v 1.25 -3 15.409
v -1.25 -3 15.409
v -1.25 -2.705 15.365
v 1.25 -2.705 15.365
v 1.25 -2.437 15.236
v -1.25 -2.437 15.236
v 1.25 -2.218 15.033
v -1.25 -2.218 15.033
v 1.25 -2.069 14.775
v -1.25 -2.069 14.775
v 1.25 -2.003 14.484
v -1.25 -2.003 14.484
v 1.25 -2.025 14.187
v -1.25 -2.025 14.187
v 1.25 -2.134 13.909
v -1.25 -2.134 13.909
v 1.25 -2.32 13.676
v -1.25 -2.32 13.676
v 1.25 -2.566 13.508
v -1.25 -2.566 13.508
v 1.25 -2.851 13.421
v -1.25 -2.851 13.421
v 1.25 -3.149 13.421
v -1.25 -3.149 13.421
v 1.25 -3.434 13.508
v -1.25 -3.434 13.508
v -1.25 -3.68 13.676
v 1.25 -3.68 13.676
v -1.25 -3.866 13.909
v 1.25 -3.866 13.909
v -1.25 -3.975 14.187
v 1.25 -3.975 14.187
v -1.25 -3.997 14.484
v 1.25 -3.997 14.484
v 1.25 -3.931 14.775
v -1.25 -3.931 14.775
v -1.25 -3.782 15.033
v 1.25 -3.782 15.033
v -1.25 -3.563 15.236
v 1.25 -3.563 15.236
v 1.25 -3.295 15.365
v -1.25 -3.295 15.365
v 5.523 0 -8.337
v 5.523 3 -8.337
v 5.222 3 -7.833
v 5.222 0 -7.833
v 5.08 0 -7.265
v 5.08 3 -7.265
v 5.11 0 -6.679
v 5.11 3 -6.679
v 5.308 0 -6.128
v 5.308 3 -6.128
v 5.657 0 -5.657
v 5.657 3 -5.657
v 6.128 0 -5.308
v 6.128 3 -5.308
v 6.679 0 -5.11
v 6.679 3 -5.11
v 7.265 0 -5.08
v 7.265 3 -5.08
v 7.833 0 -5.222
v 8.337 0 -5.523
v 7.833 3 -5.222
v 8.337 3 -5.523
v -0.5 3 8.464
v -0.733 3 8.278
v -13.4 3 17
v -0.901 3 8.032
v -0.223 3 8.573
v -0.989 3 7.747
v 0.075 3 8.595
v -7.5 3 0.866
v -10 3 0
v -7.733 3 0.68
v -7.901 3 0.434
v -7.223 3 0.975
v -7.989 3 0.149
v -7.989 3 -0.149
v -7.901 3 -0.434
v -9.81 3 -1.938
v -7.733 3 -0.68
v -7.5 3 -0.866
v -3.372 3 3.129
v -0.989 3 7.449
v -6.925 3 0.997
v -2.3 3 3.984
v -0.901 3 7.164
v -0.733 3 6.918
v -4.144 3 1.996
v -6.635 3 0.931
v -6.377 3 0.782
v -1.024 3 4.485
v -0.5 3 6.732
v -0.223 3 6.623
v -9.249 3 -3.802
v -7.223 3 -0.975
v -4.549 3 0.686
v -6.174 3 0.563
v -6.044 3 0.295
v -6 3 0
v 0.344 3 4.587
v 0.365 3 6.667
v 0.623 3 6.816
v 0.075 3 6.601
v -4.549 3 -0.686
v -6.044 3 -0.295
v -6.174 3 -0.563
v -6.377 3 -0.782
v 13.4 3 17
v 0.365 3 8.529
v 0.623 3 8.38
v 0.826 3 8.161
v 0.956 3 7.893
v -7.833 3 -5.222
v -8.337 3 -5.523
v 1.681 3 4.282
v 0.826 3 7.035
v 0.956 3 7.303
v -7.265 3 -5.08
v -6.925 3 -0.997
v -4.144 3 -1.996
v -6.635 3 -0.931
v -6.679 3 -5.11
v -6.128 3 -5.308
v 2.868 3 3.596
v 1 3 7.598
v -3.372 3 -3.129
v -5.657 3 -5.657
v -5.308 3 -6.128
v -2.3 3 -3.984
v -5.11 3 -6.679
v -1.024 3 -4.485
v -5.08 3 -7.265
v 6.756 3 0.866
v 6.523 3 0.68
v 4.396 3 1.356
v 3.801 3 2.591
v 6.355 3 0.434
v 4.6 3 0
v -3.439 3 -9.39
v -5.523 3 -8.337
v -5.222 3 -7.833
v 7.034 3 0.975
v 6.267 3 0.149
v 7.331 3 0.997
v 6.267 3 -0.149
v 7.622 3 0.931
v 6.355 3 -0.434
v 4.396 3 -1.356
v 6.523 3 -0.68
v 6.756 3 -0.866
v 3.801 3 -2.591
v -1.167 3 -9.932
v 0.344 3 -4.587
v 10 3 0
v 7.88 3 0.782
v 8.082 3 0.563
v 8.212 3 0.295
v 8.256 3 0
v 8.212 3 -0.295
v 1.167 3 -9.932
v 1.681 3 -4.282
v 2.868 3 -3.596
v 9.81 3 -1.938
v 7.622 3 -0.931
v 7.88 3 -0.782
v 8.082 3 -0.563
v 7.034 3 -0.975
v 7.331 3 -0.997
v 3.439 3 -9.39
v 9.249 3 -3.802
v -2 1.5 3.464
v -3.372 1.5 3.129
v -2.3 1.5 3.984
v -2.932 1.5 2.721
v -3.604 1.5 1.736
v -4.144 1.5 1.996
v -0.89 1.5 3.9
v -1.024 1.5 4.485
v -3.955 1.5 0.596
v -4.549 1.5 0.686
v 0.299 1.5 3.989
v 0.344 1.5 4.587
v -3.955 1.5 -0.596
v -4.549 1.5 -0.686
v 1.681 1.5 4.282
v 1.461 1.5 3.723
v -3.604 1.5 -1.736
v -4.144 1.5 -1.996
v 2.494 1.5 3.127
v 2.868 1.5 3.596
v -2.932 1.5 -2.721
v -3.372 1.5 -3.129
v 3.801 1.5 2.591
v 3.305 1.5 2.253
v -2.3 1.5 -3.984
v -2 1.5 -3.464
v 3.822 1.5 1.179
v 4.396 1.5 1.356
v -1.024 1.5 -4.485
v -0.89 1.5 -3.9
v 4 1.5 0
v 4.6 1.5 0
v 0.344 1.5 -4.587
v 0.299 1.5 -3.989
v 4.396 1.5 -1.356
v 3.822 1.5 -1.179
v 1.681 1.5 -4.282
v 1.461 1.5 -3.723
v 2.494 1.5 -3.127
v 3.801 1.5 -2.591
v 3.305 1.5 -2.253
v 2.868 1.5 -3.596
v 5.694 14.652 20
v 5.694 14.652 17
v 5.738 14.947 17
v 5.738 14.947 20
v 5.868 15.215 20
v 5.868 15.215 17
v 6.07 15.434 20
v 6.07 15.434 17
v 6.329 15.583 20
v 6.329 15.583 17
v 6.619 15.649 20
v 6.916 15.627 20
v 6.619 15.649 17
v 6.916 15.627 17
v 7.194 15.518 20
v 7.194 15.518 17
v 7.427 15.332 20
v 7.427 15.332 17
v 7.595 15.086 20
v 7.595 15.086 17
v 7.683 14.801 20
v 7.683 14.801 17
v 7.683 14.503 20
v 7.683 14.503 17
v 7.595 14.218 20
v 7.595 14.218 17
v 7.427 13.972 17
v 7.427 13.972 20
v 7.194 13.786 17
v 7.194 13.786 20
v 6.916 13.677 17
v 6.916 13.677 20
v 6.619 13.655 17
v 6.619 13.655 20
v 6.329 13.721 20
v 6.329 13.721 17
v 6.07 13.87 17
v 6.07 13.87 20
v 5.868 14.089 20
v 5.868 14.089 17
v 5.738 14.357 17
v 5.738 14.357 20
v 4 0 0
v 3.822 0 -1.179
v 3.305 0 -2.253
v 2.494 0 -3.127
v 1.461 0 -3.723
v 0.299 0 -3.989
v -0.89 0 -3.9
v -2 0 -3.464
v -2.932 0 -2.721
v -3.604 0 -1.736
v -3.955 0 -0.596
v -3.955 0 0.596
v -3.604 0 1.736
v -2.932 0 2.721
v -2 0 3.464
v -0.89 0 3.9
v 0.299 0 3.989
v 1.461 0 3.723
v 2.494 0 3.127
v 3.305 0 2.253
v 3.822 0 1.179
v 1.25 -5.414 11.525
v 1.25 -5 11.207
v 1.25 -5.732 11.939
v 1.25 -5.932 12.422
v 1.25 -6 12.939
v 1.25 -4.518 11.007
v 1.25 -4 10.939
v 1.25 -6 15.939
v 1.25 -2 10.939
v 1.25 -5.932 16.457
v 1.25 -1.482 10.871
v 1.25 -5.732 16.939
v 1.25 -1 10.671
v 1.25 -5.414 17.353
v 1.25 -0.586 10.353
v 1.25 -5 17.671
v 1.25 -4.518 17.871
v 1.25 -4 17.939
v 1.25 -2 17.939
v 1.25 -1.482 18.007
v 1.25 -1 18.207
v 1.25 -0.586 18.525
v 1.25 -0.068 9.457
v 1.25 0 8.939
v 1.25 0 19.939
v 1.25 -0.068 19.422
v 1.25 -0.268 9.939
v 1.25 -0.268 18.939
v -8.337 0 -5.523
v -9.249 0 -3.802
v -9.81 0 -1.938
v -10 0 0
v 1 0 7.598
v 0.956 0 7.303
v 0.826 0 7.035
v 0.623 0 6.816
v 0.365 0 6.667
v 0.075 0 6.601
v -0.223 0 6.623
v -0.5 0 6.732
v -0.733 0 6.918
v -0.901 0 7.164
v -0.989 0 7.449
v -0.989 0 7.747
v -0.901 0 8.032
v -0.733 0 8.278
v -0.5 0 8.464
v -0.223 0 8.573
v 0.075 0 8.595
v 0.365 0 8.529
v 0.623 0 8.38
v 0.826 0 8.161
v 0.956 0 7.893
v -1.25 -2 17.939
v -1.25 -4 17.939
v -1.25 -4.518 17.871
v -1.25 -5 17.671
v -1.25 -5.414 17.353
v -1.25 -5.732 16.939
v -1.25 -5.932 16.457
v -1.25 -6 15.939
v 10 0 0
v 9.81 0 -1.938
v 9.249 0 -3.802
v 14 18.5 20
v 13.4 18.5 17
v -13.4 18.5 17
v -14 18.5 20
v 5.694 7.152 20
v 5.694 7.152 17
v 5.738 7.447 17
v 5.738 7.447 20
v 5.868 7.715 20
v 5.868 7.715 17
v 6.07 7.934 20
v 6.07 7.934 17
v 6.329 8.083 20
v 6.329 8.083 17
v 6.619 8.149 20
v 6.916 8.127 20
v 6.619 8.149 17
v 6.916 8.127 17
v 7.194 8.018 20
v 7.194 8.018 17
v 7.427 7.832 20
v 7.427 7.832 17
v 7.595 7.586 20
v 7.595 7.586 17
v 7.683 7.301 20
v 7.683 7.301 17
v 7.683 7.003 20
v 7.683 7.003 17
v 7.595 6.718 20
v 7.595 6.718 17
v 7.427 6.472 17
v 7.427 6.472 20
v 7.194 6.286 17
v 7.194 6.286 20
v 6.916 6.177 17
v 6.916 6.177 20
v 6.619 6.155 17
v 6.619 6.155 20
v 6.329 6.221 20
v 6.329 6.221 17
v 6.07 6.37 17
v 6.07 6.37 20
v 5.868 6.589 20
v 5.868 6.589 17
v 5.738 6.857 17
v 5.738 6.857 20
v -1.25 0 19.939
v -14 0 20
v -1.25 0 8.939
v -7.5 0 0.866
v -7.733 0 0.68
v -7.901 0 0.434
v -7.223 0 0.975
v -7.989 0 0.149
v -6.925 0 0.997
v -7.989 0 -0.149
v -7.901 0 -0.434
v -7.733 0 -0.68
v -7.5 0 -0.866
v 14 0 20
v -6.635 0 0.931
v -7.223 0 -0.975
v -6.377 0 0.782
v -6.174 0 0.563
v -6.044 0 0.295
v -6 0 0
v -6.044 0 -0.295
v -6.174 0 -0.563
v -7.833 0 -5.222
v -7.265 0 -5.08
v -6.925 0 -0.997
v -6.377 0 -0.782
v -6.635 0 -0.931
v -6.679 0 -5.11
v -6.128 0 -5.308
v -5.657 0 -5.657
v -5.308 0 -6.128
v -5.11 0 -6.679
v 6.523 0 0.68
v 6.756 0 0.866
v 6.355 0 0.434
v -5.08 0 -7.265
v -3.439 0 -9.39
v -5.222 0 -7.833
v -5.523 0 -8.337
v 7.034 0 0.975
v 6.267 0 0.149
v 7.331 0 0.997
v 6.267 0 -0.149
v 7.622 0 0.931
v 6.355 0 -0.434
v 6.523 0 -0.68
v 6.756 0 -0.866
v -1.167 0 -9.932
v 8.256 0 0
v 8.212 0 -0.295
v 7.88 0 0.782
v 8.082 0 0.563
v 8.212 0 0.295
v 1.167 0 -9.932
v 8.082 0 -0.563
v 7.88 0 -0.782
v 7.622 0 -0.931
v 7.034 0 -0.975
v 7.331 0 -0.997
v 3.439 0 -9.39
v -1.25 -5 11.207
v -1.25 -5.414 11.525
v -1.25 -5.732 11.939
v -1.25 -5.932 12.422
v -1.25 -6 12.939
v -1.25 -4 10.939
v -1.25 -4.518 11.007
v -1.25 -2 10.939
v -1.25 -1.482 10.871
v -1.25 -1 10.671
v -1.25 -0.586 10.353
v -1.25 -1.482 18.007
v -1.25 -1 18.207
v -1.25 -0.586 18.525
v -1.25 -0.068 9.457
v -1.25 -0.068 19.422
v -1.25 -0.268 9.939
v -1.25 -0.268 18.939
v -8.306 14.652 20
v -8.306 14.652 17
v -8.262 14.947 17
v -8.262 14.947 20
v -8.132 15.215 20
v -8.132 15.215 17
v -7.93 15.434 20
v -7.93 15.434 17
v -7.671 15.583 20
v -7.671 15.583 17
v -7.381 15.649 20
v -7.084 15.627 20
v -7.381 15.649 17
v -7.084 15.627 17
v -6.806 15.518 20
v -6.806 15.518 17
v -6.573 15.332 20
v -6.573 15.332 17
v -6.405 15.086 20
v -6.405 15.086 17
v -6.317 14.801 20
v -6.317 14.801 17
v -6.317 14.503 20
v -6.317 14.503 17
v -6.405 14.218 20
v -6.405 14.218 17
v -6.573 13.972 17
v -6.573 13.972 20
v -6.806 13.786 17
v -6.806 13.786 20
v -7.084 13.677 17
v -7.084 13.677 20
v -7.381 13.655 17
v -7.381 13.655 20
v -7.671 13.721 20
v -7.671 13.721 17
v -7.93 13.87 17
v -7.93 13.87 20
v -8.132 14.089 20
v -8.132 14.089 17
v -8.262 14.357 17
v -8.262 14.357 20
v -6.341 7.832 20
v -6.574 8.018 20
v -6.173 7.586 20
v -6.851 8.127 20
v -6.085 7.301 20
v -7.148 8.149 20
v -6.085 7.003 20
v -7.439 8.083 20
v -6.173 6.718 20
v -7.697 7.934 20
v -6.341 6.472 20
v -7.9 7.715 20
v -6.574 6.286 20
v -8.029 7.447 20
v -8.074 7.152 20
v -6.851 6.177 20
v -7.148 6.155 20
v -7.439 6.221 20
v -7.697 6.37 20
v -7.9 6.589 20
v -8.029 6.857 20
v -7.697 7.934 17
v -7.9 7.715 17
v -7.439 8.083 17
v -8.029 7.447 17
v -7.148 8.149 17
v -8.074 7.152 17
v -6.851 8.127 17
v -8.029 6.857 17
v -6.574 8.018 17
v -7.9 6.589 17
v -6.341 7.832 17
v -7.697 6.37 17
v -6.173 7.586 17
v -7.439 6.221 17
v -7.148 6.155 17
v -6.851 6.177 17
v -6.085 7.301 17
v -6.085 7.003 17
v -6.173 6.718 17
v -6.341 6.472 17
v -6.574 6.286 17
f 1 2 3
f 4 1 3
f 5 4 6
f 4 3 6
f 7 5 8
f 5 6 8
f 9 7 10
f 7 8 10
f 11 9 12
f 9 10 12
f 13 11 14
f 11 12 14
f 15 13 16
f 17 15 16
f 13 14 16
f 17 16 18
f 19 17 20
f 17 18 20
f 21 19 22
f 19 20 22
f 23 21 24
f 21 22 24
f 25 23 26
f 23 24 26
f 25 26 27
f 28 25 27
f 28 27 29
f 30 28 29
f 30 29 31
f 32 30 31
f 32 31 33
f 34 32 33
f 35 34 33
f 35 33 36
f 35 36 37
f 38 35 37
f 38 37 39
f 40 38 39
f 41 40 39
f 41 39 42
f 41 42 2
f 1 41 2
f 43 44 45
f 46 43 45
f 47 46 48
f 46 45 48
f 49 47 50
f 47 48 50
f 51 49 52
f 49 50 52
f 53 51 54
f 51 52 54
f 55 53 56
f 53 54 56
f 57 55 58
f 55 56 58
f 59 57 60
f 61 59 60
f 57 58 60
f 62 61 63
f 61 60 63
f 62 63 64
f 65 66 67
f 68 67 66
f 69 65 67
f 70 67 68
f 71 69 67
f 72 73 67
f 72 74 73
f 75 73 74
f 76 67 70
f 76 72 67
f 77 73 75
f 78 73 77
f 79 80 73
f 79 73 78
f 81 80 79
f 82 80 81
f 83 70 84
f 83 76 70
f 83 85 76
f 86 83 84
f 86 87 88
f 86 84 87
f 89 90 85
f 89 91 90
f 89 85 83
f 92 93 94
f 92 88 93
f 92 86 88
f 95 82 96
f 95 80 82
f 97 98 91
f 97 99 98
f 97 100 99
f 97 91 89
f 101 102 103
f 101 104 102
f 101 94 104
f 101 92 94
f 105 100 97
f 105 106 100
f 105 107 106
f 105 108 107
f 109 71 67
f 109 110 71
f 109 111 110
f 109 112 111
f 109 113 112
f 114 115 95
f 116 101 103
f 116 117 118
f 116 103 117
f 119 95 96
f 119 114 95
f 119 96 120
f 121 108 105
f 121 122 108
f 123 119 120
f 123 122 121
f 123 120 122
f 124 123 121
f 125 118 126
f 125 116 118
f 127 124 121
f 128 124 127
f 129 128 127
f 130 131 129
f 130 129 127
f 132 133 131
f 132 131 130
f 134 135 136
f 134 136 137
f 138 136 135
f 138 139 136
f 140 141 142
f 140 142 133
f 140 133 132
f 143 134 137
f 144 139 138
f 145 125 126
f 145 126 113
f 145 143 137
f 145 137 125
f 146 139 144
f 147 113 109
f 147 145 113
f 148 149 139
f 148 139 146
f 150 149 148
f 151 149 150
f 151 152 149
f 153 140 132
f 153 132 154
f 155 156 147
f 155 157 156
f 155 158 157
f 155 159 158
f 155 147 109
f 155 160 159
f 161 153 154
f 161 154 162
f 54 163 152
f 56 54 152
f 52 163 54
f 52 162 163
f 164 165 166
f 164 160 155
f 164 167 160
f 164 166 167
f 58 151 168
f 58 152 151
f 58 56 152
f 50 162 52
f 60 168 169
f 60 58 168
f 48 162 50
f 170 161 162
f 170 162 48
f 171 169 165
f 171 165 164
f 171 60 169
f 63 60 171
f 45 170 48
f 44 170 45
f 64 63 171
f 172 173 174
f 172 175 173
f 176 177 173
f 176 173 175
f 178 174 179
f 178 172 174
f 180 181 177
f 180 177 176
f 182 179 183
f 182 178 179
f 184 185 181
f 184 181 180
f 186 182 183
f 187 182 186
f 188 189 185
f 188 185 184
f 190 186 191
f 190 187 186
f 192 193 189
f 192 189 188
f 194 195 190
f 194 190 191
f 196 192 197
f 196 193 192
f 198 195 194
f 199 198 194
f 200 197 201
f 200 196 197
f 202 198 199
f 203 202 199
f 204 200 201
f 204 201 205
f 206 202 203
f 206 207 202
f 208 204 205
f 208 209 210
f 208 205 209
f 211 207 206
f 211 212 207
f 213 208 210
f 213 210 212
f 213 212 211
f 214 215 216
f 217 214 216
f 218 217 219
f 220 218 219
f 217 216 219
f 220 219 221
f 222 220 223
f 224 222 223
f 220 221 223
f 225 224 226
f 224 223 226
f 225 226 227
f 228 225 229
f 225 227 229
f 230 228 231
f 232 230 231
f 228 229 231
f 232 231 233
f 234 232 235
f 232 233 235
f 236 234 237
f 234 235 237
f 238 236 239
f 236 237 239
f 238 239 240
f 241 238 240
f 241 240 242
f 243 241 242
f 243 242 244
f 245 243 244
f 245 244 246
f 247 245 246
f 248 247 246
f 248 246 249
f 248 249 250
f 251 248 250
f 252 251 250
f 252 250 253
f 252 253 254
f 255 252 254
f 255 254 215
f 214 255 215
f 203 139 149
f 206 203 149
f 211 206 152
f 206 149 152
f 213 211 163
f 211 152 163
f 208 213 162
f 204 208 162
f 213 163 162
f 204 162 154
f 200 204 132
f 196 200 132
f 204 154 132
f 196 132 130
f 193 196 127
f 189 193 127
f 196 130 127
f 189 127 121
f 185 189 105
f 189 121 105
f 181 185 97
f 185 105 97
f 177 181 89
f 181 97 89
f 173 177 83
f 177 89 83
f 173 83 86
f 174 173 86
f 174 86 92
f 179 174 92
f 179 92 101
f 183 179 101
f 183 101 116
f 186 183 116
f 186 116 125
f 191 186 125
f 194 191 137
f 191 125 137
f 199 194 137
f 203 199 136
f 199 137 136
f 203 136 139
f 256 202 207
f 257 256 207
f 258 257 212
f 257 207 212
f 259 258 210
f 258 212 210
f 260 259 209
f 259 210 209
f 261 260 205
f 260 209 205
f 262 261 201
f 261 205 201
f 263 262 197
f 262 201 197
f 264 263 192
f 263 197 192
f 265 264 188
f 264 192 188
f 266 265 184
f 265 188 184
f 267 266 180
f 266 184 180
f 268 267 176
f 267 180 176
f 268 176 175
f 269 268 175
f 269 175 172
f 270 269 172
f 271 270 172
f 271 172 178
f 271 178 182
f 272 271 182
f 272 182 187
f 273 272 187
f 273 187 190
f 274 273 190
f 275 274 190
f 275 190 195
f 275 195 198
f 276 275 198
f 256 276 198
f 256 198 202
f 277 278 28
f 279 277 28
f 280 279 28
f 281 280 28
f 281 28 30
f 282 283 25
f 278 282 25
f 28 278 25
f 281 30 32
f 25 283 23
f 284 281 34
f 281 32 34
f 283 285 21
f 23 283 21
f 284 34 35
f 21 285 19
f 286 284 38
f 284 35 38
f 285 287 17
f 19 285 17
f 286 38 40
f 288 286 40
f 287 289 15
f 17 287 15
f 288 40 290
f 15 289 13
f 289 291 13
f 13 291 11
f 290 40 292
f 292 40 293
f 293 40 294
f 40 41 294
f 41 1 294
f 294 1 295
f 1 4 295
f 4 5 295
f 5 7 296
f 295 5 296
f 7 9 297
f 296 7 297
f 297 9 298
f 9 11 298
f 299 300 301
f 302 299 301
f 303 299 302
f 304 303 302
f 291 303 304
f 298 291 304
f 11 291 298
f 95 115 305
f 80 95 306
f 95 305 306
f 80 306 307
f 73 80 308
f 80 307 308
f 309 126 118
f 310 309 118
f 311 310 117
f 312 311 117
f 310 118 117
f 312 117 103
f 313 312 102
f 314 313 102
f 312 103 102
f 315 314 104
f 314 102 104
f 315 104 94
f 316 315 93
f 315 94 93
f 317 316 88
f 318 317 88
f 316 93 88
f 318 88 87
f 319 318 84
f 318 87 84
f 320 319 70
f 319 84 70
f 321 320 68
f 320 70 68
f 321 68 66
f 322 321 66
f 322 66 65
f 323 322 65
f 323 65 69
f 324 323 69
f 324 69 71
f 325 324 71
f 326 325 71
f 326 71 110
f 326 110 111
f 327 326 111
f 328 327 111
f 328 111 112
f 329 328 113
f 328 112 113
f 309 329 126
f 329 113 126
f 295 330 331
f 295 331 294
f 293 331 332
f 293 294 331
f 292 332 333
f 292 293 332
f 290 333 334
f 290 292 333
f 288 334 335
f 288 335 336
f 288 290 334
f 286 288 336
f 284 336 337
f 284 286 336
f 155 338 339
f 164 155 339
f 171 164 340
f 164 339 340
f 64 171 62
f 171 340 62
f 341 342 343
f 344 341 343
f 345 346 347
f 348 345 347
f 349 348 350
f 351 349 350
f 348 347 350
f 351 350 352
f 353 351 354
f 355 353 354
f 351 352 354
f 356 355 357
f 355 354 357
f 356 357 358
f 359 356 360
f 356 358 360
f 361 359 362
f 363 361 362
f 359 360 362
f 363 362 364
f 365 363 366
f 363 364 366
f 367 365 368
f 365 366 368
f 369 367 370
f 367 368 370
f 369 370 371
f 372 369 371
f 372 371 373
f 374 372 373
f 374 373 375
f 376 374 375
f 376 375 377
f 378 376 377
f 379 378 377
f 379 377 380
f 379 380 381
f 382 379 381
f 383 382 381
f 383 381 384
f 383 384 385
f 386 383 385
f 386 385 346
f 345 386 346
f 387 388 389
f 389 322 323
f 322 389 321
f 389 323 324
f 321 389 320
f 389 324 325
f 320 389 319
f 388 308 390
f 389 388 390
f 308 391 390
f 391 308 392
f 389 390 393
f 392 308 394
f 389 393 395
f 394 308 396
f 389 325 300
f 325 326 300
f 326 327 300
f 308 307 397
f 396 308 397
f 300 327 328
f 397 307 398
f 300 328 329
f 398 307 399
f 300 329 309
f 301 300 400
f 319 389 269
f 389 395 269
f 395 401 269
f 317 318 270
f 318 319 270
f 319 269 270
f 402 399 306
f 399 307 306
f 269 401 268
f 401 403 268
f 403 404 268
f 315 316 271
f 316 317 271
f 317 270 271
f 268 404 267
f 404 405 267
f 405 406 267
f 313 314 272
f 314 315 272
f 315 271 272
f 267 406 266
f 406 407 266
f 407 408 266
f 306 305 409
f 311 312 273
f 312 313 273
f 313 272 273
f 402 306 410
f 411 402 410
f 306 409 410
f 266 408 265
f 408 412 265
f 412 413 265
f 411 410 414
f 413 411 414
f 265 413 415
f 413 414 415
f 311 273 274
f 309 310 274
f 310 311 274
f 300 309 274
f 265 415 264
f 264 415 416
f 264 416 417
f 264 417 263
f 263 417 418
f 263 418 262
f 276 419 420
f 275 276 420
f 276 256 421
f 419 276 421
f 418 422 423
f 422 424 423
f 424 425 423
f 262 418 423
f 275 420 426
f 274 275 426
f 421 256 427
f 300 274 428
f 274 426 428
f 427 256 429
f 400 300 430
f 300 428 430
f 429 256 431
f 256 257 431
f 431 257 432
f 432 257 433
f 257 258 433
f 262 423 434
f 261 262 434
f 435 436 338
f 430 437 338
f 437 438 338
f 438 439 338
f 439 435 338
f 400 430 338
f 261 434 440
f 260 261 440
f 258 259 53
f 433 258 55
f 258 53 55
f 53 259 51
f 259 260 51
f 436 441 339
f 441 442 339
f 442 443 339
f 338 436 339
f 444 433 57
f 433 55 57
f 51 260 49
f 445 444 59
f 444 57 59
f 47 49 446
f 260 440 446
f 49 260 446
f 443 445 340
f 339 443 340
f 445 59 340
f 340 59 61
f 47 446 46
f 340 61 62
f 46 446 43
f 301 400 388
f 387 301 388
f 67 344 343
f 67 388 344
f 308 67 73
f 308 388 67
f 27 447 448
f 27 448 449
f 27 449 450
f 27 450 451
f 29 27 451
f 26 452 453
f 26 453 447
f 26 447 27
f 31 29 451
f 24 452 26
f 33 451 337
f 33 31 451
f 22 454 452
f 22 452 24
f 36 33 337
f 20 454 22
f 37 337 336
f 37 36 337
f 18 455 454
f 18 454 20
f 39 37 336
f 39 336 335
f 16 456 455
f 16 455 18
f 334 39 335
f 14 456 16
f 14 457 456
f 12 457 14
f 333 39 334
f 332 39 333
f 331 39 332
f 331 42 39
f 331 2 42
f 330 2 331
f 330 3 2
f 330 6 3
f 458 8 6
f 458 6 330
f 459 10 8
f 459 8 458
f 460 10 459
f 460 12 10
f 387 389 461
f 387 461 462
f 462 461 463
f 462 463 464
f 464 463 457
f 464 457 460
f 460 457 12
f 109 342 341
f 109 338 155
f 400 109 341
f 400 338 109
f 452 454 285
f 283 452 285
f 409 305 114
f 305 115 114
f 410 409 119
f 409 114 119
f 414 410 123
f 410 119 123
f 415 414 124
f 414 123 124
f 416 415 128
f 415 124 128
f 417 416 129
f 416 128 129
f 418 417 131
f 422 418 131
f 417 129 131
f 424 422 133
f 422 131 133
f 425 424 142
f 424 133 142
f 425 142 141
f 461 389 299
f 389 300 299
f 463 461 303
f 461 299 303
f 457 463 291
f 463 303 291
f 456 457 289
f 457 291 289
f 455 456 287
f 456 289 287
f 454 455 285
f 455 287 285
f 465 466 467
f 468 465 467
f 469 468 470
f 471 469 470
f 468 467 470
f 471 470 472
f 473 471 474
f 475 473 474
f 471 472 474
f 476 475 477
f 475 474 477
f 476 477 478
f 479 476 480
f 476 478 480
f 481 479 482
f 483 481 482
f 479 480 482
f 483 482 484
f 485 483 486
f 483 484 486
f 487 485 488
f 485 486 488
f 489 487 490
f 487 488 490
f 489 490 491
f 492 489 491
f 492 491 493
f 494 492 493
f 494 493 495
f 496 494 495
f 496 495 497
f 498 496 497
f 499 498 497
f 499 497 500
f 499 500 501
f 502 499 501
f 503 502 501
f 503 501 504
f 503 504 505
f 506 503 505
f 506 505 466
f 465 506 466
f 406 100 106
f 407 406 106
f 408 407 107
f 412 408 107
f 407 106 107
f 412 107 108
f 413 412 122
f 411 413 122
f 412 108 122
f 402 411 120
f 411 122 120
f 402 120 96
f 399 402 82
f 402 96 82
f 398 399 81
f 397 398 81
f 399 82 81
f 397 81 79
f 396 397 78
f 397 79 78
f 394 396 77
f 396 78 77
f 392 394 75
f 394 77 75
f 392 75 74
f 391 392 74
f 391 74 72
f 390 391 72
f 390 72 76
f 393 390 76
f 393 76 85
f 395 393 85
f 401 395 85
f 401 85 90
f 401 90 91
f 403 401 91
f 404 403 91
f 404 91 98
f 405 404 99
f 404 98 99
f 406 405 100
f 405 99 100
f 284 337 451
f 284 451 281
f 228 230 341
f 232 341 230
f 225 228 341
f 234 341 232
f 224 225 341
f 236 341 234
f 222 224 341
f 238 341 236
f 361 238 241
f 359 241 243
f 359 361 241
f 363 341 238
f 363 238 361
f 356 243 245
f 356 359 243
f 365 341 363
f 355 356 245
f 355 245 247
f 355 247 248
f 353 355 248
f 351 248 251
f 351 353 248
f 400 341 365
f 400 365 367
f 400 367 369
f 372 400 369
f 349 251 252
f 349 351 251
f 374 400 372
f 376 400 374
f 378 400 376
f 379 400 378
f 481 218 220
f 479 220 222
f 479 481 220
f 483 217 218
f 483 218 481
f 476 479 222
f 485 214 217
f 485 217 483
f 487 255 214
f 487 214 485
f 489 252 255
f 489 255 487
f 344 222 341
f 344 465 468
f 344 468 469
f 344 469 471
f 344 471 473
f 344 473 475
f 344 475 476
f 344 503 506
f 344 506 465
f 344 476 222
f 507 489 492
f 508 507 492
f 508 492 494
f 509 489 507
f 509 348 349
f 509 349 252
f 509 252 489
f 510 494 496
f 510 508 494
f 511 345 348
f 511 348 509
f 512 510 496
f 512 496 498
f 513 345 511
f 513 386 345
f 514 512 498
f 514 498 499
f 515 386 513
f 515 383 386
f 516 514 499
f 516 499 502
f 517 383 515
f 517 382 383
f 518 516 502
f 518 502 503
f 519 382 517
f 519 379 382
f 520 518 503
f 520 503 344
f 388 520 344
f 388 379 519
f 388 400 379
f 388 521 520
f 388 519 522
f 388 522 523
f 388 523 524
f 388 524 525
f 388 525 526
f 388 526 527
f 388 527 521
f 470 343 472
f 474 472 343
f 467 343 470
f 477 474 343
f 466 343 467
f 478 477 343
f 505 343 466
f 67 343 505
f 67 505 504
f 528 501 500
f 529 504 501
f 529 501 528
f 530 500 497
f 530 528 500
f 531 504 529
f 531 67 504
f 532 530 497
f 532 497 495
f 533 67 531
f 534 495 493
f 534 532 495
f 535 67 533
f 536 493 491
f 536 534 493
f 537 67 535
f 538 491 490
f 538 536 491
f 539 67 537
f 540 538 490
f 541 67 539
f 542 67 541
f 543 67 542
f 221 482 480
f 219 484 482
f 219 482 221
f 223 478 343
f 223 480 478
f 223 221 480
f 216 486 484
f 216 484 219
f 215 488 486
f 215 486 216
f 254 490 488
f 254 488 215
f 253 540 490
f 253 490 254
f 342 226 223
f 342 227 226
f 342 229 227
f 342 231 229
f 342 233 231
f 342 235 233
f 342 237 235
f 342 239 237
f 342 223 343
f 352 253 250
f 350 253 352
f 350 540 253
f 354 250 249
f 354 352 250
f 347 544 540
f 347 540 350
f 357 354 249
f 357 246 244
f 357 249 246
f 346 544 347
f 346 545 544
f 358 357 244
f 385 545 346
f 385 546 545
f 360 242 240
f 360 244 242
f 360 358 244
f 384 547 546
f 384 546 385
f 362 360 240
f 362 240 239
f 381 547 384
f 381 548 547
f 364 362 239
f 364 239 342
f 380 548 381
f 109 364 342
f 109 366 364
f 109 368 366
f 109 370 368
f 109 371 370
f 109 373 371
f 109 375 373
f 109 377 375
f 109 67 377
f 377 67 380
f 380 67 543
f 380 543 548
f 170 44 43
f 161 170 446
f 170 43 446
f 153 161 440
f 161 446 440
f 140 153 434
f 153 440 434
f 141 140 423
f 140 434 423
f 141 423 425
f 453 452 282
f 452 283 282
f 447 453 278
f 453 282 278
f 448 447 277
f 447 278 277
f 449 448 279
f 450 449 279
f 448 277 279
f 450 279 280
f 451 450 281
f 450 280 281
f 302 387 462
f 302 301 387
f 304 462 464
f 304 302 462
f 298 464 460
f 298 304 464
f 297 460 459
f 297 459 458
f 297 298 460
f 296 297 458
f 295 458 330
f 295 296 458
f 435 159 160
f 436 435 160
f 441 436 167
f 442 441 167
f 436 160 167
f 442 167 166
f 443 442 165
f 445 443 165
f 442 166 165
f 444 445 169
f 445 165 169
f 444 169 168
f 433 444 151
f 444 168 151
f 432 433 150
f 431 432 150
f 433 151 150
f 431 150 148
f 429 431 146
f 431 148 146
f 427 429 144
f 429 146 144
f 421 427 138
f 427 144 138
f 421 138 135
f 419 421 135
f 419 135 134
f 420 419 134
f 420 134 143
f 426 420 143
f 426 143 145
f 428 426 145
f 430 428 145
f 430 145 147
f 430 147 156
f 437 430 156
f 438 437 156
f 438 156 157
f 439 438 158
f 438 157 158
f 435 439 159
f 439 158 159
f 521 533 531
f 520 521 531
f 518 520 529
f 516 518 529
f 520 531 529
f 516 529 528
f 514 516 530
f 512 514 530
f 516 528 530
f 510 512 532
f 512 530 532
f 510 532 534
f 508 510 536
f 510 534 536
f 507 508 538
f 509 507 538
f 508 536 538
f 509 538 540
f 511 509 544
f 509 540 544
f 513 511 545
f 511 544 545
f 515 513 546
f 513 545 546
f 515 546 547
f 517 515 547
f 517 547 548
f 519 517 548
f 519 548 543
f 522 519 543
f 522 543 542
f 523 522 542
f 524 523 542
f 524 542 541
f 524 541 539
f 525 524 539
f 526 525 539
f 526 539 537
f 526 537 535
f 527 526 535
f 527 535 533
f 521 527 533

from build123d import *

# Parameters (mm, degrees)
BOSS_EXTRUDE1_DEPTH = 3
SKETCH2_R           = 4
CUT_EXTRUDE1_DEPTH  = 13
BOSS_EXTRUDE2_DEPTH = 15.5
SKETCH6_R           = 4.6
CUT_EXTRUDE4_DEPTH  = 1.5
SKETCH7_R           = 2
CUT_EXTRUDE5_DEPTH  = 10
SKETCH8_R           = 1
CUT_EXTRUDE6_DEPTH  = 10
SKETCH4_R           = 1
CUT_EXTRUDE9_DEPTH  = 3
SKETCH11_R          = 1
CUT_EXTRUDE11_DEPTH = 3
SKETCH12_W          = 2.5
SKETCH12_H          = 7
BOSS_EXTRUDE3_DEPTH = 6
SKETCH13_R          = 1
CUT_EXTRUDE12_DEPTH = 6
FILLET1_R           = 2


with BuildPart() as part:
    # Sketch1 → Boss-Extrude1 (new body)
    with BuildSketch(Plane(origin=(0, 0, 0), x_dir=(1, 0, 0), z_dir=(0, 1, 0))):
        with BuildLine():
            Line((-10, 0), (-14, -20))
            Line((-14, -20), (14, -20))
            Line((14, -20), (10, 0))
            ThreePointArc((10, 0), (0, 10), (-10, 0))
        make_face()
    extrude(amount=BOSS_EXTRUDE1_DEPTH)

    # Sketch2 → Cut-Extrude1 (cut)
    with BuildSketch(Plane(origin=(0, 3, 0), x_dir=(1, 0, 0), z_dir=(0, 1, 0))):
        Circle(SKETCH2_R)
    extrude(amount=-CUT_EXTRUDE1_DEPTH, mode=Mode.SUBTRACT)

    # Sketch5 → Boss-Extrude2 (add)
    with BuildSketch(Plane(origin=(0, 3, 0), x_dir=(1, 0, 0), z_dir=(0, 1, 0))):
        Polygon((-13.4, -17), (13.4, -17), (14, -20), (-14, -20), align=None)
    extrude(amount=BOSS_EXTRUDE2_DEPTH)

    # Sketch6 → Cut-Extrude4 (cut)
    with BuildSketch(Plane(origin=(0, 3, 0), x_dir=(1, 0, 0), z_dir=(0, 1, 0))):
        Circle(SKETCH6_R)
    extrude(amount=-CUT_EXTRUDE4_DEPTH, mode=Mode.SUBTRACT)

    # Sketch7 → Cut-Extrude5 (cut)
    with BuildSketch(Plane(origin=(0, 3, 0), x_dir=(1, 0, 0), z_dir=(0, 1, 0))):
        with Locations((-7.071067812, 7.071067812)):
            Circle(SKETCH7_R)
        with Locations((7.071067812, 7.071067812)):
            Circle(SKETCH7_R)
    extrude(amount=-CUT_EXTRUDE5_DEPTH, mode=Mode.SUBTRACT)

    # Sketch8 → Cut-Extrude6 (cut)
    with BuildSketch(Plane(origin=(0, 0, 17), x_dir=(-1, 0, 0), z_dir=(0, 0, -1))):
        with Locations((-6.69393863, 7.151837118)):
            Circle(SKETCH8_R)
        with Locations((-6.69393863, 14.651837118)):
            Circle(SKETCH8_R)
        with Locations((7.30606137, 14.651837118)):
            Circle(SKETCH8_R)
        with Locations((7.073668949, 7.151837118)):
            Circle(SKETCH8_R)
    extrude(amount=-CUT_EXTRUDE6_DEPTH, mode=Mode.SUBTRACT)

    # Sketch4 → Cut-Extrude9 (cut)
    with BuildSketch(Plane(origin=(0, 3, 0), x_dir=(1, 0, 0), z_dir=(0, 1, 0))):
        with Locations((-7, 0)):
            Circle(SKETCH4_R)
    extrude(amount=-CUT_EXTRUDE9_DEPTH, mode=Mode.SUBTRACT)

    # Sketch11 → Cut-Extrude11 (cut)
    with BuildSketch(Plane(origin=(0, 3, 0), x_dir=(1, 0, 0), z_dir=(0, 1, 0))):
        with Locations((0, -7.597940957)):
            Circle(SKETCH11_R)
        with Locations((7.256224789, 0)):
            Circle(SKETCH11_R)
    extrude(amount=-CUT_EXTRUDE11_DEPTH, mode=Mode.SUBTRACT)

    # Sketch12 → Boss-Extrude3 (add)
    with BuildSketch(Plane.XZ):
        with Locations((0, 14.439281905)):
            Rectangle(SKETCH12_W, SKETCH12_H)
    extrude(amount=BOSS_EXTRUDE3_DEPTH)

    # Sketch13 → Cut-Extrude12 (cut)
    with BuildSketch(Plane.ZY.offset(1.25)):
        with Locations((14.409447897, -3)):
            Circle(SKETCH13_R)
    extrude(amount=-CUT_EXTRUDE12_DEPTH, mode=Mode.SUBTRACT)

    # Fillet1
    fillet1_edges = [part.edges().sort_by_distance(p)[0] for p in [
        (0, -6, 17.939281905),
        (0, 0, 10.939281905),
        (0, 0, 17.939281905),
        (0, -6, 10.939281905),
    ]]
    fillet(fillet1_edges, radius=FILLET1_R)


solid = part.part
